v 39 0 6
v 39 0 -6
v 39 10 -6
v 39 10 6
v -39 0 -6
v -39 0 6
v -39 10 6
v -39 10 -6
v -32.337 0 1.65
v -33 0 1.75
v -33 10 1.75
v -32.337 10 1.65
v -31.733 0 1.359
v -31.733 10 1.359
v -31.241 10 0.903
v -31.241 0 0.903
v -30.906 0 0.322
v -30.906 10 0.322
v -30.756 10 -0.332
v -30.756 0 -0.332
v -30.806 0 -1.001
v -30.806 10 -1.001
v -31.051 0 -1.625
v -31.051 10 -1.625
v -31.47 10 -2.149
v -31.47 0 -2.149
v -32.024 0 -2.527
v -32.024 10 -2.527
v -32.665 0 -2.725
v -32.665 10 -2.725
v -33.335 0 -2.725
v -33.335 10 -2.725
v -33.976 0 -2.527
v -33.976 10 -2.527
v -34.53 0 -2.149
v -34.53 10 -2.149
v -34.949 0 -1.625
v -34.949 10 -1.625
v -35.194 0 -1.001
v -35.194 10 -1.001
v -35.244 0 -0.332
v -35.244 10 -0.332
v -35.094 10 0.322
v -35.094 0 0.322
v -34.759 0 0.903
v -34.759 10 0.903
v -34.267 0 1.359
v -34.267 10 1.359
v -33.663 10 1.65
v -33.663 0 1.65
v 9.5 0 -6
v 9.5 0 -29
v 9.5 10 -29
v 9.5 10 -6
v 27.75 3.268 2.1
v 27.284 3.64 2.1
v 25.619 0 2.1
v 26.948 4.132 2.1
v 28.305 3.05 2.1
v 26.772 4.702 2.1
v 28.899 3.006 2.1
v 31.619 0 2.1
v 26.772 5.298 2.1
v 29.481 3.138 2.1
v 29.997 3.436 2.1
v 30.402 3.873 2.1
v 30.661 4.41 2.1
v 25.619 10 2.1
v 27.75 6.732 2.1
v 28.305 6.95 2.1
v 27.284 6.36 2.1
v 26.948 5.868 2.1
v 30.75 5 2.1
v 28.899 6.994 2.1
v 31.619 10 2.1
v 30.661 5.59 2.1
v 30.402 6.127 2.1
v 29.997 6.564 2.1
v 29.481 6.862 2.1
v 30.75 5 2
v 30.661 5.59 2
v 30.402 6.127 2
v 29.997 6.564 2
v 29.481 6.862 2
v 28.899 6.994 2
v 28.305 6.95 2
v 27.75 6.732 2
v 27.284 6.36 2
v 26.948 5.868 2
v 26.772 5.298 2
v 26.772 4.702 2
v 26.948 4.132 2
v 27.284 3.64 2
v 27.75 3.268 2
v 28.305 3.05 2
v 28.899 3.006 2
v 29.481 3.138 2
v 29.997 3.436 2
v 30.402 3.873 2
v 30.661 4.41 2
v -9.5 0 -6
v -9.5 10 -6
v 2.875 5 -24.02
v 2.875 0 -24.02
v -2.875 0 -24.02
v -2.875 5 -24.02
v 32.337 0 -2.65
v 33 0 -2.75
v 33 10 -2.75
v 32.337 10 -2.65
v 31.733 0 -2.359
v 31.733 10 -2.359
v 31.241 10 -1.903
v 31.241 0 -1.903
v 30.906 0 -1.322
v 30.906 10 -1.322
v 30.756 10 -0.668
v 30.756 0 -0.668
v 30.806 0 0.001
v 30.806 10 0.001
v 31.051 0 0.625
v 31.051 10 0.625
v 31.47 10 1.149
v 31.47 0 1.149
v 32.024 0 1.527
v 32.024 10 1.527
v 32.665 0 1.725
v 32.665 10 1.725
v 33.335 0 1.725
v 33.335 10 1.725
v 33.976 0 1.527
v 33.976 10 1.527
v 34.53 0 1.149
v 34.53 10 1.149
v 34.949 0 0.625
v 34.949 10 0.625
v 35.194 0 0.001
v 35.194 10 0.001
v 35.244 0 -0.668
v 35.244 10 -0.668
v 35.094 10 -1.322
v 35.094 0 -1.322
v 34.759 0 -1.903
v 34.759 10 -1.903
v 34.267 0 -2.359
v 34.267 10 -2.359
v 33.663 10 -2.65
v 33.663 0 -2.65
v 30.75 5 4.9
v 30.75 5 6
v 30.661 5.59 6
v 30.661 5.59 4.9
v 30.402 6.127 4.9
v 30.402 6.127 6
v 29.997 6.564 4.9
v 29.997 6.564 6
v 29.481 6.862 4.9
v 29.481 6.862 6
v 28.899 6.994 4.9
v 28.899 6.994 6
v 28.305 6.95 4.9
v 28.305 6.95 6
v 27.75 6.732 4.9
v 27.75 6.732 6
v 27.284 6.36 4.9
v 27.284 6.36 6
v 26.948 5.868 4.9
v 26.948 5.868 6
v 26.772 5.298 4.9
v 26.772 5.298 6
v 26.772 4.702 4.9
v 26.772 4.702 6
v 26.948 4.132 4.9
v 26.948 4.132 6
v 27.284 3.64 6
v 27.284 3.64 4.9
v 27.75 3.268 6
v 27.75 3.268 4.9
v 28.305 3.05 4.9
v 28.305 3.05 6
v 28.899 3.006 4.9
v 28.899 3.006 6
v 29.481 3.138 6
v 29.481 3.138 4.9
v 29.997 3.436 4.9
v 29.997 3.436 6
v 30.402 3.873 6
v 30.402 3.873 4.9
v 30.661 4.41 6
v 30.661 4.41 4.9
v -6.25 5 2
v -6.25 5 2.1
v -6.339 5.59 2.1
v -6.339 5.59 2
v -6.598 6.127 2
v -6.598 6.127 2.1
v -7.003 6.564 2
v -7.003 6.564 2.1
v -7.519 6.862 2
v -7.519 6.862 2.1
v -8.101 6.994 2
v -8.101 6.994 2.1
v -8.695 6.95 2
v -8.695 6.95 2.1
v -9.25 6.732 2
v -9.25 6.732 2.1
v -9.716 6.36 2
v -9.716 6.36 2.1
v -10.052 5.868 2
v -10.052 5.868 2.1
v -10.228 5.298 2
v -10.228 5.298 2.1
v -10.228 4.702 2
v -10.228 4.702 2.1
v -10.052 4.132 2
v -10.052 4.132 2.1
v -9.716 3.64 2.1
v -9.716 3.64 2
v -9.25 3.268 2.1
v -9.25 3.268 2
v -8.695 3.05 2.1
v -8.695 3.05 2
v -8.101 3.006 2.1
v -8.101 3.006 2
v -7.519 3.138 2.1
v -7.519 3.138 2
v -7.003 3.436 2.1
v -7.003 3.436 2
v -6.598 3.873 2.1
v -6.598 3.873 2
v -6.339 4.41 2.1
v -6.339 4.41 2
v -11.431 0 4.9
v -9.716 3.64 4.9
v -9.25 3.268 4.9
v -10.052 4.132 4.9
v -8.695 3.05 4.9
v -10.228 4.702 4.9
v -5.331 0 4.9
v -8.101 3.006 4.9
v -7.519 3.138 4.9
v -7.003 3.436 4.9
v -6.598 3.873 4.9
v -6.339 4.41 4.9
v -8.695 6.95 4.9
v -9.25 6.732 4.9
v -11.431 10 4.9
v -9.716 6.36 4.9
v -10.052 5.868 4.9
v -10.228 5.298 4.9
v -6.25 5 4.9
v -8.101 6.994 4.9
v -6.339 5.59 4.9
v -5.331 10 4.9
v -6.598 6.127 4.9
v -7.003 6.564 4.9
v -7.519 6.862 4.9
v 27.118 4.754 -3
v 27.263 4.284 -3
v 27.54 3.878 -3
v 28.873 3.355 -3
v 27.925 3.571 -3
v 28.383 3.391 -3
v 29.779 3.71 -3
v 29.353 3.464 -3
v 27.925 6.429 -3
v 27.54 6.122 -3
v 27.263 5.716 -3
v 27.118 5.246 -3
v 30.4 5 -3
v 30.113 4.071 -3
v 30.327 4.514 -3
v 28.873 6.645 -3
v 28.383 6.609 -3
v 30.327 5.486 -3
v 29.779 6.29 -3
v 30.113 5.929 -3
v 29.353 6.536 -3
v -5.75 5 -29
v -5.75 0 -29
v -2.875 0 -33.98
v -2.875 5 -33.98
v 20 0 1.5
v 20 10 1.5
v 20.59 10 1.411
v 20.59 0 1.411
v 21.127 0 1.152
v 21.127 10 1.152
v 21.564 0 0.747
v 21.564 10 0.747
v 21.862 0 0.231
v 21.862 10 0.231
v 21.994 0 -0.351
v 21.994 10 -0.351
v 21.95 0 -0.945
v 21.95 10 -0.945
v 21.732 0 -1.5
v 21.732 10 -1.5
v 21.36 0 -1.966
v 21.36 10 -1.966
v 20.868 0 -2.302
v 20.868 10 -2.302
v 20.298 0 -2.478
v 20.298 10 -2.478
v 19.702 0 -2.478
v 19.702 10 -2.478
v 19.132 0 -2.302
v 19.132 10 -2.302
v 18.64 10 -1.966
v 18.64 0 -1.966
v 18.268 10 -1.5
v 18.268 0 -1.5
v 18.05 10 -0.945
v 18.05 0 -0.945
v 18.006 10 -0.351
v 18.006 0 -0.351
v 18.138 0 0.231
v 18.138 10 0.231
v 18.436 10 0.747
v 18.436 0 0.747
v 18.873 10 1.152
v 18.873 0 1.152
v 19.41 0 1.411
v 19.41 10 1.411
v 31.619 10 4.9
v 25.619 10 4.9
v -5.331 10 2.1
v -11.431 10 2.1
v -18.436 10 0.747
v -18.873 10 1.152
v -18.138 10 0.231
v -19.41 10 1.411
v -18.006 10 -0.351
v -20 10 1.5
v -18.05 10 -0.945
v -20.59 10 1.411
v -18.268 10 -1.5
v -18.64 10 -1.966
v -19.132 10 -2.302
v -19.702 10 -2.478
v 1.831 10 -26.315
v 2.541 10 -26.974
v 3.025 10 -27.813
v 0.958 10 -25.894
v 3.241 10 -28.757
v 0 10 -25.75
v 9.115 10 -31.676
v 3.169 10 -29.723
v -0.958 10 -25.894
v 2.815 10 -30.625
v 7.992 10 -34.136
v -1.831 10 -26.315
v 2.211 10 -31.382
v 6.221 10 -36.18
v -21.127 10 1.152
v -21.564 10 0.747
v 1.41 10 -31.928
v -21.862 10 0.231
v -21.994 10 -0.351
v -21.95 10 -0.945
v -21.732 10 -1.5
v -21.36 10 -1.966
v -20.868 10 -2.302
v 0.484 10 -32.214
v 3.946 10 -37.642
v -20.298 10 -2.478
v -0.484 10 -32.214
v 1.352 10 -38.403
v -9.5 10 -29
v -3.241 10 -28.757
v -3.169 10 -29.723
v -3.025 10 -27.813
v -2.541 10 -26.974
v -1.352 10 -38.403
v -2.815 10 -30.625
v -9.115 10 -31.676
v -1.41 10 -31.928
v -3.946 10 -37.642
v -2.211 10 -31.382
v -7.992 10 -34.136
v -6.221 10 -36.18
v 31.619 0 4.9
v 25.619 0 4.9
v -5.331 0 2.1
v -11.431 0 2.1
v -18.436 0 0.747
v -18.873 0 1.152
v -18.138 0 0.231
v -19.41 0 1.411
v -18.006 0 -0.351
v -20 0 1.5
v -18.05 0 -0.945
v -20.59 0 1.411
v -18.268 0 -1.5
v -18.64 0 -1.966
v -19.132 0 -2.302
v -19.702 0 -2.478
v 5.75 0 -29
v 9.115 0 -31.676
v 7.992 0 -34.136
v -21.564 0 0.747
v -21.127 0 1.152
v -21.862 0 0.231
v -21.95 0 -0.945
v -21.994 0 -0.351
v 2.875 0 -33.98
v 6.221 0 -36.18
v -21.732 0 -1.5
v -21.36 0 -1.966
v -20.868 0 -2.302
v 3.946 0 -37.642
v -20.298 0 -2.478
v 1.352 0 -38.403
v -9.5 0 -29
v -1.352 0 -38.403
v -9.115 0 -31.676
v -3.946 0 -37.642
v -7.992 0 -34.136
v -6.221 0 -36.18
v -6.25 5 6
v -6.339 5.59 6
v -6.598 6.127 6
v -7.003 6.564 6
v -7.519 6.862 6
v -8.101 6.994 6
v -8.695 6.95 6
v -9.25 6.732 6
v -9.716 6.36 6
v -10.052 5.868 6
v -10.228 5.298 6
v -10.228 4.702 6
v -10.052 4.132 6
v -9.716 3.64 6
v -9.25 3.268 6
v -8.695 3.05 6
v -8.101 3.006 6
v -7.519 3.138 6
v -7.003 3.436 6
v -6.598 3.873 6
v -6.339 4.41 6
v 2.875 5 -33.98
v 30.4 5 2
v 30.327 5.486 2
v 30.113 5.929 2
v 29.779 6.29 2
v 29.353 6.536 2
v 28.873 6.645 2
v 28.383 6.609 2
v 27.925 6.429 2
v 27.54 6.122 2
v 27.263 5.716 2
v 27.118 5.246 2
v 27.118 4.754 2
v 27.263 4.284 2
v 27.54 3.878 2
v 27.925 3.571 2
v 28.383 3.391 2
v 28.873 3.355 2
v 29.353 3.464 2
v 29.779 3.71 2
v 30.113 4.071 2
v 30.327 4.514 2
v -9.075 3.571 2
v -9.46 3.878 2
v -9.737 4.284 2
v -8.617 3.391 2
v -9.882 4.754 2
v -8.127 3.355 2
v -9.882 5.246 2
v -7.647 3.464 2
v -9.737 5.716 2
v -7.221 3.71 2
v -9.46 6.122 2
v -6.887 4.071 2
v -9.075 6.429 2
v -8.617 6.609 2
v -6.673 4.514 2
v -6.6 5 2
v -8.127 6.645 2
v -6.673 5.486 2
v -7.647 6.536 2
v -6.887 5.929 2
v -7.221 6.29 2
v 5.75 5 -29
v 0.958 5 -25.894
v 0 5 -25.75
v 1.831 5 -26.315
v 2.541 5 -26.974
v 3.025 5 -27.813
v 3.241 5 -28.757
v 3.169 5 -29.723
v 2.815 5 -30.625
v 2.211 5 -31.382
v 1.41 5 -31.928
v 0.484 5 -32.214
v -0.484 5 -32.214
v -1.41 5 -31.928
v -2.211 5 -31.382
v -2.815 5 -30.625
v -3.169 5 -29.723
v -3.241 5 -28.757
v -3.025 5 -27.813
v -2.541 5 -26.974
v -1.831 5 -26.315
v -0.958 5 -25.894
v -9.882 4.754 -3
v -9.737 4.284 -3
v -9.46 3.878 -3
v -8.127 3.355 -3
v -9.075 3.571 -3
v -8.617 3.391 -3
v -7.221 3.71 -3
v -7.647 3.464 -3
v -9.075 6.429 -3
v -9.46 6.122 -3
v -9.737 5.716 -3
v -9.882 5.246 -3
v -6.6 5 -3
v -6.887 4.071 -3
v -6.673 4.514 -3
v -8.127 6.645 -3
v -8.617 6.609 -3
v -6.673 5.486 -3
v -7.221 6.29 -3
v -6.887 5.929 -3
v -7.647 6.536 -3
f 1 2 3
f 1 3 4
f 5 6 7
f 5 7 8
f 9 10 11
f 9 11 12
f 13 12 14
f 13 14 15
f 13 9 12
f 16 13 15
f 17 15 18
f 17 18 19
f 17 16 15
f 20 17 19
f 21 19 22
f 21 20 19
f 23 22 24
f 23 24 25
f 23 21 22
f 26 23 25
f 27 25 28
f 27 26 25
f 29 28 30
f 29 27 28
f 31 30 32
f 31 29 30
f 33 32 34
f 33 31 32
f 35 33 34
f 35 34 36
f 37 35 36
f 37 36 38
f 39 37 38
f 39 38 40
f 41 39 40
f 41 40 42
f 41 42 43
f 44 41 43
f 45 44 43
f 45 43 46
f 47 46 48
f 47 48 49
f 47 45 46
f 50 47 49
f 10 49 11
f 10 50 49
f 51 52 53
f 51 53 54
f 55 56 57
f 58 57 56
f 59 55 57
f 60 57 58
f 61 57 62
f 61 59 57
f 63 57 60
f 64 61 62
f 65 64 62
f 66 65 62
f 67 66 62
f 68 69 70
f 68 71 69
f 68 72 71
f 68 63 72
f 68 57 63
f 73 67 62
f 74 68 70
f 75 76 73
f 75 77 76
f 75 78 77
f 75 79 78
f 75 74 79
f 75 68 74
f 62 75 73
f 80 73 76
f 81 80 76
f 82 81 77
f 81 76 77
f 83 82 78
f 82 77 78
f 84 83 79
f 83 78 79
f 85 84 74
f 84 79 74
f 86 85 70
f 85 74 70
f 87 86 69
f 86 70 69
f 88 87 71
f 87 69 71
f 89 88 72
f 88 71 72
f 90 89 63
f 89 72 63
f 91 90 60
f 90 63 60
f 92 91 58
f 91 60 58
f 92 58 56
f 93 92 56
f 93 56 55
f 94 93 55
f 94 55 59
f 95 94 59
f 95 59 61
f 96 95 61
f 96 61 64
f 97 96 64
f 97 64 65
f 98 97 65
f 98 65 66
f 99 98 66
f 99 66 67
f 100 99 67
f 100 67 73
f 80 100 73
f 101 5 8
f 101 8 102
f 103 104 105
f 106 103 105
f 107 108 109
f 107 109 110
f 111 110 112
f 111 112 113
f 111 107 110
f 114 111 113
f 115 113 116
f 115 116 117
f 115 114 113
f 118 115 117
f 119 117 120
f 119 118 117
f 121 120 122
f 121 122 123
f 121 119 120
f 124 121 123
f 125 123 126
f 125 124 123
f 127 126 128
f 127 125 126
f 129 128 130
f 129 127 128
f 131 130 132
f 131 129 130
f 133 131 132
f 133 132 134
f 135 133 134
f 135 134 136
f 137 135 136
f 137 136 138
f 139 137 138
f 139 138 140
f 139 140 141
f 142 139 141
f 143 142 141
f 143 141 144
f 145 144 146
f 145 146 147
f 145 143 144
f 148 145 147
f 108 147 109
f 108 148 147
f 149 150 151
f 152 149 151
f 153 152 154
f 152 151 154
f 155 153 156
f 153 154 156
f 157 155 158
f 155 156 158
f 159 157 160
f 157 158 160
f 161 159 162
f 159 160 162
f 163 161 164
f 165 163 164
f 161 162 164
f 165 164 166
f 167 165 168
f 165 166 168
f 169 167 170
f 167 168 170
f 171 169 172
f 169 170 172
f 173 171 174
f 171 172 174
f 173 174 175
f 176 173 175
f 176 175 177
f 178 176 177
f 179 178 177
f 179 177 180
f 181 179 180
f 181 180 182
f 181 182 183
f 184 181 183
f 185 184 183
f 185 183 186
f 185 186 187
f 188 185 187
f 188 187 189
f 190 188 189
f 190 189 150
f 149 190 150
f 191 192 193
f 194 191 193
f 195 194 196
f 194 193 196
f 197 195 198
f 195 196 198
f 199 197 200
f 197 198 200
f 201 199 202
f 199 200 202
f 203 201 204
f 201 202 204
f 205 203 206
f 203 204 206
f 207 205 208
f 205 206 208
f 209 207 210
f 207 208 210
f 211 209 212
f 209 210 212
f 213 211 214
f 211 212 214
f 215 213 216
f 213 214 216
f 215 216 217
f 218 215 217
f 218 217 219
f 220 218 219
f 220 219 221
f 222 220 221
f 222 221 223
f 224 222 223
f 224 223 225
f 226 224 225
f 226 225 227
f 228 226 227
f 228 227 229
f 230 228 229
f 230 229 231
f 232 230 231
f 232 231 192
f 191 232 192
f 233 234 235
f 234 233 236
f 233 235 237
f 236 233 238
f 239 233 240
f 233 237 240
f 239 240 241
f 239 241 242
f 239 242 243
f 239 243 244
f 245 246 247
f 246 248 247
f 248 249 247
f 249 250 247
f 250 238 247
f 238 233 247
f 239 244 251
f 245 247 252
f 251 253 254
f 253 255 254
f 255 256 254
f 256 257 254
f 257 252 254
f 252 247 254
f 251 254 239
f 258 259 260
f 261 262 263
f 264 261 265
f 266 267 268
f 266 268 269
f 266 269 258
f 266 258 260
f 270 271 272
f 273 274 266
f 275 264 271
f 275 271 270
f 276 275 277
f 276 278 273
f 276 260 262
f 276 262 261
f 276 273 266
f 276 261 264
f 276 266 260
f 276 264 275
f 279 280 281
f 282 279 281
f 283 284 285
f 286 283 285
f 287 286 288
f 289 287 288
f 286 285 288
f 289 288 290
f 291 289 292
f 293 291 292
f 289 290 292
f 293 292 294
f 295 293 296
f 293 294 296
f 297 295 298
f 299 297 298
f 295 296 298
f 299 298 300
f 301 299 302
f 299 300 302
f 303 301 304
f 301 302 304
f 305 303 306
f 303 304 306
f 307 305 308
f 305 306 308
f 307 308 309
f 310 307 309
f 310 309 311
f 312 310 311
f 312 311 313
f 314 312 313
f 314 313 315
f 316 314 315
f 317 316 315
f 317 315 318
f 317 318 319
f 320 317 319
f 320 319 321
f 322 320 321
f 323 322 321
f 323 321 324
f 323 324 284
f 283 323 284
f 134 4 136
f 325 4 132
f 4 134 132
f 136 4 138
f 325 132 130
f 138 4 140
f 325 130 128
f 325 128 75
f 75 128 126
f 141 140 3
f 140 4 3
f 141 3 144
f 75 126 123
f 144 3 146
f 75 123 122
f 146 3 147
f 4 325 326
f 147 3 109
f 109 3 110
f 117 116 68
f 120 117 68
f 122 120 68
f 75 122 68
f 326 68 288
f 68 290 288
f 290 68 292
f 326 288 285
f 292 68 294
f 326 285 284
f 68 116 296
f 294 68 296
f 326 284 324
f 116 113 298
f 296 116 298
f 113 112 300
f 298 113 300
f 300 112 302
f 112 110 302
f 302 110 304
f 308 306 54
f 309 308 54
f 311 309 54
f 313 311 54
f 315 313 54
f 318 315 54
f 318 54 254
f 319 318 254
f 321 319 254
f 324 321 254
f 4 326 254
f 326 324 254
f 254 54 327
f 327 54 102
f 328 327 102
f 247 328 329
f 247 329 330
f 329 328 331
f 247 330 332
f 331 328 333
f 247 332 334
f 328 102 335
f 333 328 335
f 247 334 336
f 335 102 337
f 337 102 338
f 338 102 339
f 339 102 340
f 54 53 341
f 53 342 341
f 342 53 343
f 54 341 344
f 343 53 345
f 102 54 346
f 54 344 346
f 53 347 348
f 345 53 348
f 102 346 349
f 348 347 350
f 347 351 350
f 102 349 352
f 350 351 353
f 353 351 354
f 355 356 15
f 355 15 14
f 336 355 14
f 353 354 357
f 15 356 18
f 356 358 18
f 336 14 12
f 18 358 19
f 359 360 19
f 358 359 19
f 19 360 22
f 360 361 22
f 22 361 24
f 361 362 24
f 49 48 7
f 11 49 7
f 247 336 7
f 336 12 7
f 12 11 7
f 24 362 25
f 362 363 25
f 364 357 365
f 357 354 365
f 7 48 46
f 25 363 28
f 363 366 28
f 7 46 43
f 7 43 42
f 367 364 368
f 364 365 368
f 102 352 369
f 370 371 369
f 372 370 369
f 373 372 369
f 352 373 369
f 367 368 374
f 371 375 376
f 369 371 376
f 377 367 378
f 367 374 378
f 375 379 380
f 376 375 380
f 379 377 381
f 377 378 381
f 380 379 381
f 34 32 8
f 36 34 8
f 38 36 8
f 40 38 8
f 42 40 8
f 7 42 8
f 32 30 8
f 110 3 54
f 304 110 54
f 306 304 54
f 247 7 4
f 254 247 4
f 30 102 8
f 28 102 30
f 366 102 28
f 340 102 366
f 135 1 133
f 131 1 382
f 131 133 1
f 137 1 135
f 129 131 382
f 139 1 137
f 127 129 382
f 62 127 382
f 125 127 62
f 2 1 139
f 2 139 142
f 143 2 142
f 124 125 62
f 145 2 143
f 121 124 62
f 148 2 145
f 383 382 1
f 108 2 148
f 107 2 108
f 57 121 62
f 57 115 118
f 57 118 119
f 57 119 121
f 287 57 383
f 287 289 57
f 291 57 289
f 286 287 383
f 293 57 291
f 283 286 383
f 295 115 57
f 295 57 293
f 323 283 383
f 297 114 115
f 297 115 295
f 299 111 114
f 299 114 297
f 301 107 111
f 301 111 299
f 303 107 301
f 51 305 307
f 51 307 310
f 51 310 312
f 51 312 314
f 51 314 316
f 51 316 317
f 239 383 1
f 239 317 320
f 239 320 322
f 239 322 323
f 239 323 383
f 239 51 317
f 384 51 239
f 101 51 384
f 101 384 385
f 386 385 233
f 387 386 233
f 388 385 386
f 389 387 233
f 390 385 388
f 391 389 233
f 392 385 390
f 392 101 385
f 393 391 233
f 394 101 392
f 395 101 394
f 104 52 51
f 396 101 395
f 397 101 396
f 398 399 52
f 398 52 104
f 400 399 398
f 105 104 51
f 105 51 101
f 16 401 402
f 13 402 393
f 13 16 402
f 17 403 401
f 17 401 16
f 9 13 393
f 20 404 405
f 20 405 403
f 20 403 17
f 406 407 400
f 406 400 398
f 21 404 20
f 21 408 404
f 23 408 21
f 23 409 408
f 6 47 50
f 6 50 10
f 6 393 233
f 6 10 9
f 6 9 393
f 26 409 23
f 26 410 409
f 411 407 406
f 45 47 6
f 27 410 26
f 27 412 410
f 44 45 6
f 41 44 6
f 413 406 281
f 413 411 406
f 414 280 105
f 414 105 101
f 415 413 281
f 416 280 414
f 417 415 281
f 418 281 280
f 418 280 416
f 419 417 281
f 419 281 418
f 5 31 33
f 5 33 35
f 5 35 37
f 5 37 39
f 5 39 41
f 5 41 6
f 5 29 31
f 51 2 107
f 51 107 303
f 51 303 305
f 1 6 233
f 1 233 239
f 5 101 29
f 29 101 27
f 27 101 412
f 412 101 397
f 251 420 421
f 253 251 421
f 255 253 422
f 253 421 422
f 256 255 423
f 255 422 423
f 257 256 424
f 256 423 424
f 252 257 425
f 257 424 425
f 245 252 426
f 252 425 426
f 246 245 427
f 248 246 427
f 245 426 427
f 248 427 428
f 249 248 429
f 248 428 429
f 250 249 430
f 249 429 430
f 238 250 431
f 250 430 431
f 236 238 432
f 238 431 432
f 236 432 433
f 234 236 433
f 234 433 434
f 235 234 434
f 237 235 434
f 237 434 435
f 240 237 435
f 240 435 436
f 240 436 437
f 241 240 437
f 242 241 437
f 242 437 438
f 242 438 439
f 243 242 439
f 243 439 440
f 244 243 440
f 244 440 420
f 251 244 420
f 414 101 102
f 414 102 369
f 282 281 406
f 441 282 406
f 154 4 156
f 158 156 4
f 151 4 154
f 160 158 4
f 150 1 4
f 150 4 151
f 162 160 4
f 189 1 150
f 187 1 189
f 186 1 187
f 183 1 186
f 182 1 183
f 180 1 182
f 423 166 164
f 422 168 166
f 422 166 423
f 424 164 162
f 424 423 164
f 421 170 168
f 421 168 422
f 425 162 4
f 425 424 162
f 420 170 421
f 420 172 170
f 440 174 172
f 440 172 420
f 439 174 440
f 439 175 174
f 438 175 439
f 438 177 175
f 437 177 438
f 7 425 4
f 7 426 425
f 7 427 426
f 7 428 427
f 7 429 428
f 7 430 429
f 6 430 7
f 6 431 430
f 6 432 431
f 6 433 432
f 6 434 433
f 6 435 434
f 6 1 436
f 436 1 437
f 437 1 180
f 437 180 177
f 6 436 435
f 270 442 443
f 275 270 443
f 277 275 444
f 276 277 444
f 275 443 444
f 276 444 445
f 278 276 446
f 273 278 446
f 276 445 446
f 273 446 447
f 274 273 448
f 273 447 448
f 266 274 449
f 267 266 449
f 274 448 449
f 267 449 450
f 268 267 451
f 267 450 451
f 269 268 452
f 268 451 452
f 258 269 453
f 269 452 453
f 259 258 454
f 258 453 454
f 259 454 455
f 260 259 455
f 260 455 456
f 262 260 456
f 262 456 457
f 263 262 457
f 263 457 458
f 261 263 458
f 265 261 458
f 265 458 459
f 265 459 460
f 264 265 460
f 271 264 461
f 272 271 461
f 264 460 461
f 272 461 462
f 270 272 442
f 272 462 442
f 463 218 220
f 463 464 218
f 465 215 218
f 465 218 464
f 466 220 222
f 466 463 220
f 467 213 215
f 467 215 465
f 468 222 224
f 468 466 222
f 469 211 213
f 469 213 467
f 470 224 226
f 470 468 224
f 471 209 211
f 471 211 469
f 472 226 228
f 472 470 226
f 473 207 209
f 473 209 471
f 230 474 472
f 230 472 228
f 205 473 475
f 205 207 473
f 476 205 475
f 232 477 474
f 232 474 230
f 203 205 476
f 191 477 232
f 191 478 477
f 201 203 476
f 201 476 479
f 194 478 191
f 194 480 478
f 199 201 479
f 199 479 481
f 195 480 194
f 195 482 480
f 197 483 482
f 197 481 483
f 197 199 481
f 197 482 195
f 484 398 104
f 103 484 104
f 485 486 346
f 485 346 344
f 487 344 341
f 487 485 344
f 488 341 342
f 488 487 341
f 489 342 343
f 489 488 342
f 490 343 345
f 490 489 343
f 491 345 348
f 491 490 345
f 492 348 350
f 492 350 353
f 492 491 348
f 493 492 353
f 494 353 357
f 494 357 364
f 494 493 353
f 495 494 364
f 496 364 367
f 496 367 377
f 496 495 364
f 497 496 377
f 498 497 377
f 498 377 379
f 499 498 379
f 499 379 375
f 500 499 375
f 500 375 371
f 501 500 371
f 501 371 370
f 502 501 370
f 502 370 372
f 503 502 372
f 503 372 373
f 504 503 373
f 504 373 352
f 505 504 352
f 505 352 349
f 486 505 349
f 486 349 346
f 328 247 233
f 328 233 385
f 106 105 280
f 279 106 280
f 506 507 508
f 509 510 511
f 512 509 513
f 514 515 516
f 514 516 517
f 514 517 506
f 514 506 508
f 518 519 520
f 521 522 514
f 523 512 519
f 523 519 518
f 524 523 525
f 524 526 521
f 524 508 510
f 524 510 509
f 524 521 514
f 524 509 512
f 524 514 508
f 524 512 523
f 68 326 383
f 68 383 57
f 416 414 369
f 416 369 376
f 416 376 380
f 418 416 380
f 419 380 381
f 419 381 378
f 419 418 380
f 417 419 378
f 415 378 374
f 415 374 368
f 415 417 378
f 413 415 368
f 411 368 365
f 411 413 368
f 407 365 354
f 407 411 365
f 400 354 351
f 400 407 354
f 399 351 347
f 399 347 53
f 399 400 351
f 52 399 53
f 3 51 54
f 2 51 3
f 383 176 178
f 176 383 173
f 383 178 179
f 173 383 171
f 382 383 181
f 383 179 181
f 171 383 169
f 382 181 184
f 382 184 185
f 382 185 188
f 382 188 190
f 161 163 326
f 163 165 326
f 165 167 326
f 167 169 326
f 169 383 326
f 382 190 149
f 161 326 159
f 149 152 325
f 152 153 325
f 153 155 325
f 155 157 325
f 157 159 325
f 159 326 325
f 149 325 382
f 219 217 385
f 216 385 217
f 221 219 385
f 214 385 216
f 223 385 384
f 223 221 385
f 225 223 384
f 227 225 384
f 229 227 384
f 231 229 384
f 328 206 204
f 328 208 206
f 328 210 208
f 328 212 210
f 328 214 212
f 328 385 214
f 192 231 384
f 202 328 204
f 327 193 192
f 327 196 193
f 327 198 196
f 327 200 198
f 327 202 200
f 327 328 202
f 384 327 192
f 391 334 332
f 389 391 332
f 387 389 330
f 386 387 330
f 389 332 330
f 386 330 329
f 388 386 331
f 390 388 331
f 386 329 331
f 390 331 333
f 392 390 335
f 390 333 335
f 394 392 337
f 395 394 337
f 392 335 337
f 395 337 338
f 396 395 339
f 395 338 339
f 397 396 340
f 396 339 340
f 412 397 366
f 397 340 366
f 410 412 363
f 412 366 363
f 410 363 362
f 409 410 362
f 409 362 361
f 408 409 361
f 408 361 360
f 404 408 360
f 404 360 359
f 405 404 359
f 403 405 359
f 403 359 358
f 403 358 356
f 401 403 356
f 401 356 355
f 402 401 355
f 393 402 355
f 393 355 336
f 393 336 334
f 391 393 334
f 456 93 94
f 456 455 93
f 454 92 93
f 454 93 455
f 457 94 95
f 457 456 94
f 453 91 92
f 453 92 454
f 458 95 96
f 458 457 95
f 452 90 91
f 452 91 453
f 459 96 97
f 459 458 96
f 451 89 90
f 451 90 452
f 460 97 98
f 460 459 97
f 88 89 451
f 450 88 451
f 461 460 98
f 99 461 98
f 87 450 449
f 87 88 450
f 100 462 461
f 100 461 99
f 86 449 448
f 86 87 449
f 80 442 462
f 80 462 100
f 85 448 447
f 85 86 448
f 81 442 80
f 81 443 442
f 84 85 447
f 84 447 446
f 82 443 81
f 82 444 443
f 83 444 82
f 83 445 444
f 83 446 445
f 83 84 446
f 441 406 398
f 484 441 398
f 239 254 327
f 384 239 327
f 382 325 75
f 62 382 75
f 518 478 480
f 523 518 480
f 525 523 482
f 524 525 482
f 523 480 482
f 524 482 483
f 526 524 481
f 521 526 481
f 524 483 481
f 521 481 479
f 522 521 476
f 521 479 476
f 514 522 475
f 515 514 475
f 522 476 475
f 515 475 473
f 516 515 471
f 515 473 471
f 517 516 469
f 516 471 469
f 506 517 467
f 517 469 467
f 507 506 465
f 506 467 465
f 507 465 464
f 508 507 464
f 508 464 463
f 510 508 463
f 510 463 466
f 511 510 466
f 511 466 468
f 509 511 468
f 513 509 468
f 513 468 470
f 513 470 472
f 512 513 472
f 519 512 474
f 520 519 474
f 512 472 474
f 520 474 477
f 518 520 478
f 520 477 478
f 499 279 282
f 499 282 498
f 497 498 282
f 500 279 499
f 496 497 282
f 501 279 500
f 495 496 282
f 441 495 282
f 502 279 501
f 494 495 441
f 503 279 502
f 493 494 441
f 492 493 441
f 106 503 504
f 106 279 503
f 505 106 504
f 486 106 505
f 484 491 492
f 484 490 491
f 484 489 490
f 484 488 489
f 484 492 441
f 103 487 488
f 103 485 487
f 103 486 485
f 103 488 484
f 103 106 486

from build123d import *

# Parameters (mm, degrees)
IZIM1_R                     = 3.25
IZIM1_R_2                   = 2.25
Y_KSEKLIK_EKSTR_ZYON1_DEPTH = 10
KES_EKSTR_ZYON1_DEPTH       = 5
IZIM3_R                     = 2
KES_EKSTR_ZYON4_DEPTH       = 4
IZIM4_W                     = 6.1
IZIM4_H                     = 2.8
IZIM4_W_2                   = 6
KES_EKSTR_ZYON5_DEPTH       = 10
IZIM5_R                     = 1.65
KES_EKSTR_ZYON6_DEPTH       = 5
IZIM6_R                     = 2
KES_EKSTR_ZYON7_DEPTH       = 13


with BuildPart() as part:
    # Çizim1 → Yükseklik-Ekstrüzyon1 (new body)
    with BuildSketch(Plane(origin=(0, 0, 0), x_dir=(1, 0, 0), z_dir=(0, 1, 0))):
        with BuildLine():
            Line((9.5, 6), (39, 6))
            Line((39, 6), (39, -6))
            Line((39, -6), (-39, -6))
            Line((-39, -6), (-39, 6))
            Line((-39, 6), (-9.5, 6))
            Line((-9.5, 6), (-9.5, 29))
            ThreePointArc((-9.5, 29), (0, 38.5), (9.5, 29))
            Line((9.5, 29), (9.5, 6))
        make_face()
        with Locations(Location((0, 29, 0), (0, 0, 270))):
            Circle(IZIM1_R, mode=Mode.SUBTRACT)
        with Locations(Location((-33, 0.5, 0), (0, 0, 270))):
            Circle(IZIM1_R_2, mode=Mode.SUBTRACT)
        with Locations(Location((33, 0.5, 0), (0, 0, 90))):
            Circle(IZIM1_R_2, mode=Mode.SUBTRACT)
    extrude(amount=Y_KSEKLIK_EKSTR_ZYON1_DEPTH)

    # Çizim2 → Kes-Ekstrüzyon1 (cut)
    with BuildSketch(Plane.XZ):
        Polygon((5.75, -29), (2.875, -24.020353928), (-2.875, -24.020353928), (-5.75, -29), (-2.875, -33.979646072), (2.875, -33.979646072), align=None)
    extrude(amount=-KES_EKSTR_ZYON1_DEPTH, mode=Mode.SUBTRACT)

    # Çizim3 → Kes-Ekstrüzyon4 (cut)
    with BuildSketch(Plane.XY.offset(6)):
        with Locations((-8.25, 5)):
            Circle(IZIM3_R)
        with Locations((28.75, 5)):
            Circle(IZIM3_R)
    extrude(amount=-KES_EKSTR_ZYON4_DEPTH, mode=Mode.SUBTRACT)

    # Çizim4 → Kes-Ekstrüzyon5 (cut)
    with BuildSketch(Plane(origin=(0, 10, 0), x_dir=(1, 0, 0), z_dir=(0, 1, 0))):
        with Locations((-8.380873527, -3.5)):
            Rectangle(IZIM4_W, IZIM4_H)
        with Locations((28.619126473, -3.5)):
            Rectangle(IZIM4_W_2, IZIM4_H)
    extrude(amount=-KES_EKSTR_ZYON5_DEPTH, mode=Mode.SUBTRACT)

    # Çizim5 → Kes-Ekstrüzyon6 (cut)
    with BuildSketch(Plane.XY.offset(2)):
        with Locations((-8.25, 5)):
            Circle(IZIM5_R)
        with Locations((28.75, 5)):
            Circle(IZIM5_R)
    extrude(amount=-KES_EKSTR_ZYON6_DEPTH, mode=Mode.SUBTRACT)

    # Çizim6 → Kes-Ekstrüzyon7 (cut)
    with BuildSketch(Plane(origin=(0, 10, 0), x_dir=(1, 0, 0), z_dir=(0, 1, 0))):
        with Locations(Location((-20, 0.5, 0), (0, 0, 270))):
            Circle(IZIM6_R)
        with Locations(Location((20, 0.5, 0), (0, 0, 270))):
            Circle(IZIM6_R)
    extrude(amount=-KES_EKSTR_ZYON7_DEPTH, mode=Mode.SUBTRACT)


solid = part.part
